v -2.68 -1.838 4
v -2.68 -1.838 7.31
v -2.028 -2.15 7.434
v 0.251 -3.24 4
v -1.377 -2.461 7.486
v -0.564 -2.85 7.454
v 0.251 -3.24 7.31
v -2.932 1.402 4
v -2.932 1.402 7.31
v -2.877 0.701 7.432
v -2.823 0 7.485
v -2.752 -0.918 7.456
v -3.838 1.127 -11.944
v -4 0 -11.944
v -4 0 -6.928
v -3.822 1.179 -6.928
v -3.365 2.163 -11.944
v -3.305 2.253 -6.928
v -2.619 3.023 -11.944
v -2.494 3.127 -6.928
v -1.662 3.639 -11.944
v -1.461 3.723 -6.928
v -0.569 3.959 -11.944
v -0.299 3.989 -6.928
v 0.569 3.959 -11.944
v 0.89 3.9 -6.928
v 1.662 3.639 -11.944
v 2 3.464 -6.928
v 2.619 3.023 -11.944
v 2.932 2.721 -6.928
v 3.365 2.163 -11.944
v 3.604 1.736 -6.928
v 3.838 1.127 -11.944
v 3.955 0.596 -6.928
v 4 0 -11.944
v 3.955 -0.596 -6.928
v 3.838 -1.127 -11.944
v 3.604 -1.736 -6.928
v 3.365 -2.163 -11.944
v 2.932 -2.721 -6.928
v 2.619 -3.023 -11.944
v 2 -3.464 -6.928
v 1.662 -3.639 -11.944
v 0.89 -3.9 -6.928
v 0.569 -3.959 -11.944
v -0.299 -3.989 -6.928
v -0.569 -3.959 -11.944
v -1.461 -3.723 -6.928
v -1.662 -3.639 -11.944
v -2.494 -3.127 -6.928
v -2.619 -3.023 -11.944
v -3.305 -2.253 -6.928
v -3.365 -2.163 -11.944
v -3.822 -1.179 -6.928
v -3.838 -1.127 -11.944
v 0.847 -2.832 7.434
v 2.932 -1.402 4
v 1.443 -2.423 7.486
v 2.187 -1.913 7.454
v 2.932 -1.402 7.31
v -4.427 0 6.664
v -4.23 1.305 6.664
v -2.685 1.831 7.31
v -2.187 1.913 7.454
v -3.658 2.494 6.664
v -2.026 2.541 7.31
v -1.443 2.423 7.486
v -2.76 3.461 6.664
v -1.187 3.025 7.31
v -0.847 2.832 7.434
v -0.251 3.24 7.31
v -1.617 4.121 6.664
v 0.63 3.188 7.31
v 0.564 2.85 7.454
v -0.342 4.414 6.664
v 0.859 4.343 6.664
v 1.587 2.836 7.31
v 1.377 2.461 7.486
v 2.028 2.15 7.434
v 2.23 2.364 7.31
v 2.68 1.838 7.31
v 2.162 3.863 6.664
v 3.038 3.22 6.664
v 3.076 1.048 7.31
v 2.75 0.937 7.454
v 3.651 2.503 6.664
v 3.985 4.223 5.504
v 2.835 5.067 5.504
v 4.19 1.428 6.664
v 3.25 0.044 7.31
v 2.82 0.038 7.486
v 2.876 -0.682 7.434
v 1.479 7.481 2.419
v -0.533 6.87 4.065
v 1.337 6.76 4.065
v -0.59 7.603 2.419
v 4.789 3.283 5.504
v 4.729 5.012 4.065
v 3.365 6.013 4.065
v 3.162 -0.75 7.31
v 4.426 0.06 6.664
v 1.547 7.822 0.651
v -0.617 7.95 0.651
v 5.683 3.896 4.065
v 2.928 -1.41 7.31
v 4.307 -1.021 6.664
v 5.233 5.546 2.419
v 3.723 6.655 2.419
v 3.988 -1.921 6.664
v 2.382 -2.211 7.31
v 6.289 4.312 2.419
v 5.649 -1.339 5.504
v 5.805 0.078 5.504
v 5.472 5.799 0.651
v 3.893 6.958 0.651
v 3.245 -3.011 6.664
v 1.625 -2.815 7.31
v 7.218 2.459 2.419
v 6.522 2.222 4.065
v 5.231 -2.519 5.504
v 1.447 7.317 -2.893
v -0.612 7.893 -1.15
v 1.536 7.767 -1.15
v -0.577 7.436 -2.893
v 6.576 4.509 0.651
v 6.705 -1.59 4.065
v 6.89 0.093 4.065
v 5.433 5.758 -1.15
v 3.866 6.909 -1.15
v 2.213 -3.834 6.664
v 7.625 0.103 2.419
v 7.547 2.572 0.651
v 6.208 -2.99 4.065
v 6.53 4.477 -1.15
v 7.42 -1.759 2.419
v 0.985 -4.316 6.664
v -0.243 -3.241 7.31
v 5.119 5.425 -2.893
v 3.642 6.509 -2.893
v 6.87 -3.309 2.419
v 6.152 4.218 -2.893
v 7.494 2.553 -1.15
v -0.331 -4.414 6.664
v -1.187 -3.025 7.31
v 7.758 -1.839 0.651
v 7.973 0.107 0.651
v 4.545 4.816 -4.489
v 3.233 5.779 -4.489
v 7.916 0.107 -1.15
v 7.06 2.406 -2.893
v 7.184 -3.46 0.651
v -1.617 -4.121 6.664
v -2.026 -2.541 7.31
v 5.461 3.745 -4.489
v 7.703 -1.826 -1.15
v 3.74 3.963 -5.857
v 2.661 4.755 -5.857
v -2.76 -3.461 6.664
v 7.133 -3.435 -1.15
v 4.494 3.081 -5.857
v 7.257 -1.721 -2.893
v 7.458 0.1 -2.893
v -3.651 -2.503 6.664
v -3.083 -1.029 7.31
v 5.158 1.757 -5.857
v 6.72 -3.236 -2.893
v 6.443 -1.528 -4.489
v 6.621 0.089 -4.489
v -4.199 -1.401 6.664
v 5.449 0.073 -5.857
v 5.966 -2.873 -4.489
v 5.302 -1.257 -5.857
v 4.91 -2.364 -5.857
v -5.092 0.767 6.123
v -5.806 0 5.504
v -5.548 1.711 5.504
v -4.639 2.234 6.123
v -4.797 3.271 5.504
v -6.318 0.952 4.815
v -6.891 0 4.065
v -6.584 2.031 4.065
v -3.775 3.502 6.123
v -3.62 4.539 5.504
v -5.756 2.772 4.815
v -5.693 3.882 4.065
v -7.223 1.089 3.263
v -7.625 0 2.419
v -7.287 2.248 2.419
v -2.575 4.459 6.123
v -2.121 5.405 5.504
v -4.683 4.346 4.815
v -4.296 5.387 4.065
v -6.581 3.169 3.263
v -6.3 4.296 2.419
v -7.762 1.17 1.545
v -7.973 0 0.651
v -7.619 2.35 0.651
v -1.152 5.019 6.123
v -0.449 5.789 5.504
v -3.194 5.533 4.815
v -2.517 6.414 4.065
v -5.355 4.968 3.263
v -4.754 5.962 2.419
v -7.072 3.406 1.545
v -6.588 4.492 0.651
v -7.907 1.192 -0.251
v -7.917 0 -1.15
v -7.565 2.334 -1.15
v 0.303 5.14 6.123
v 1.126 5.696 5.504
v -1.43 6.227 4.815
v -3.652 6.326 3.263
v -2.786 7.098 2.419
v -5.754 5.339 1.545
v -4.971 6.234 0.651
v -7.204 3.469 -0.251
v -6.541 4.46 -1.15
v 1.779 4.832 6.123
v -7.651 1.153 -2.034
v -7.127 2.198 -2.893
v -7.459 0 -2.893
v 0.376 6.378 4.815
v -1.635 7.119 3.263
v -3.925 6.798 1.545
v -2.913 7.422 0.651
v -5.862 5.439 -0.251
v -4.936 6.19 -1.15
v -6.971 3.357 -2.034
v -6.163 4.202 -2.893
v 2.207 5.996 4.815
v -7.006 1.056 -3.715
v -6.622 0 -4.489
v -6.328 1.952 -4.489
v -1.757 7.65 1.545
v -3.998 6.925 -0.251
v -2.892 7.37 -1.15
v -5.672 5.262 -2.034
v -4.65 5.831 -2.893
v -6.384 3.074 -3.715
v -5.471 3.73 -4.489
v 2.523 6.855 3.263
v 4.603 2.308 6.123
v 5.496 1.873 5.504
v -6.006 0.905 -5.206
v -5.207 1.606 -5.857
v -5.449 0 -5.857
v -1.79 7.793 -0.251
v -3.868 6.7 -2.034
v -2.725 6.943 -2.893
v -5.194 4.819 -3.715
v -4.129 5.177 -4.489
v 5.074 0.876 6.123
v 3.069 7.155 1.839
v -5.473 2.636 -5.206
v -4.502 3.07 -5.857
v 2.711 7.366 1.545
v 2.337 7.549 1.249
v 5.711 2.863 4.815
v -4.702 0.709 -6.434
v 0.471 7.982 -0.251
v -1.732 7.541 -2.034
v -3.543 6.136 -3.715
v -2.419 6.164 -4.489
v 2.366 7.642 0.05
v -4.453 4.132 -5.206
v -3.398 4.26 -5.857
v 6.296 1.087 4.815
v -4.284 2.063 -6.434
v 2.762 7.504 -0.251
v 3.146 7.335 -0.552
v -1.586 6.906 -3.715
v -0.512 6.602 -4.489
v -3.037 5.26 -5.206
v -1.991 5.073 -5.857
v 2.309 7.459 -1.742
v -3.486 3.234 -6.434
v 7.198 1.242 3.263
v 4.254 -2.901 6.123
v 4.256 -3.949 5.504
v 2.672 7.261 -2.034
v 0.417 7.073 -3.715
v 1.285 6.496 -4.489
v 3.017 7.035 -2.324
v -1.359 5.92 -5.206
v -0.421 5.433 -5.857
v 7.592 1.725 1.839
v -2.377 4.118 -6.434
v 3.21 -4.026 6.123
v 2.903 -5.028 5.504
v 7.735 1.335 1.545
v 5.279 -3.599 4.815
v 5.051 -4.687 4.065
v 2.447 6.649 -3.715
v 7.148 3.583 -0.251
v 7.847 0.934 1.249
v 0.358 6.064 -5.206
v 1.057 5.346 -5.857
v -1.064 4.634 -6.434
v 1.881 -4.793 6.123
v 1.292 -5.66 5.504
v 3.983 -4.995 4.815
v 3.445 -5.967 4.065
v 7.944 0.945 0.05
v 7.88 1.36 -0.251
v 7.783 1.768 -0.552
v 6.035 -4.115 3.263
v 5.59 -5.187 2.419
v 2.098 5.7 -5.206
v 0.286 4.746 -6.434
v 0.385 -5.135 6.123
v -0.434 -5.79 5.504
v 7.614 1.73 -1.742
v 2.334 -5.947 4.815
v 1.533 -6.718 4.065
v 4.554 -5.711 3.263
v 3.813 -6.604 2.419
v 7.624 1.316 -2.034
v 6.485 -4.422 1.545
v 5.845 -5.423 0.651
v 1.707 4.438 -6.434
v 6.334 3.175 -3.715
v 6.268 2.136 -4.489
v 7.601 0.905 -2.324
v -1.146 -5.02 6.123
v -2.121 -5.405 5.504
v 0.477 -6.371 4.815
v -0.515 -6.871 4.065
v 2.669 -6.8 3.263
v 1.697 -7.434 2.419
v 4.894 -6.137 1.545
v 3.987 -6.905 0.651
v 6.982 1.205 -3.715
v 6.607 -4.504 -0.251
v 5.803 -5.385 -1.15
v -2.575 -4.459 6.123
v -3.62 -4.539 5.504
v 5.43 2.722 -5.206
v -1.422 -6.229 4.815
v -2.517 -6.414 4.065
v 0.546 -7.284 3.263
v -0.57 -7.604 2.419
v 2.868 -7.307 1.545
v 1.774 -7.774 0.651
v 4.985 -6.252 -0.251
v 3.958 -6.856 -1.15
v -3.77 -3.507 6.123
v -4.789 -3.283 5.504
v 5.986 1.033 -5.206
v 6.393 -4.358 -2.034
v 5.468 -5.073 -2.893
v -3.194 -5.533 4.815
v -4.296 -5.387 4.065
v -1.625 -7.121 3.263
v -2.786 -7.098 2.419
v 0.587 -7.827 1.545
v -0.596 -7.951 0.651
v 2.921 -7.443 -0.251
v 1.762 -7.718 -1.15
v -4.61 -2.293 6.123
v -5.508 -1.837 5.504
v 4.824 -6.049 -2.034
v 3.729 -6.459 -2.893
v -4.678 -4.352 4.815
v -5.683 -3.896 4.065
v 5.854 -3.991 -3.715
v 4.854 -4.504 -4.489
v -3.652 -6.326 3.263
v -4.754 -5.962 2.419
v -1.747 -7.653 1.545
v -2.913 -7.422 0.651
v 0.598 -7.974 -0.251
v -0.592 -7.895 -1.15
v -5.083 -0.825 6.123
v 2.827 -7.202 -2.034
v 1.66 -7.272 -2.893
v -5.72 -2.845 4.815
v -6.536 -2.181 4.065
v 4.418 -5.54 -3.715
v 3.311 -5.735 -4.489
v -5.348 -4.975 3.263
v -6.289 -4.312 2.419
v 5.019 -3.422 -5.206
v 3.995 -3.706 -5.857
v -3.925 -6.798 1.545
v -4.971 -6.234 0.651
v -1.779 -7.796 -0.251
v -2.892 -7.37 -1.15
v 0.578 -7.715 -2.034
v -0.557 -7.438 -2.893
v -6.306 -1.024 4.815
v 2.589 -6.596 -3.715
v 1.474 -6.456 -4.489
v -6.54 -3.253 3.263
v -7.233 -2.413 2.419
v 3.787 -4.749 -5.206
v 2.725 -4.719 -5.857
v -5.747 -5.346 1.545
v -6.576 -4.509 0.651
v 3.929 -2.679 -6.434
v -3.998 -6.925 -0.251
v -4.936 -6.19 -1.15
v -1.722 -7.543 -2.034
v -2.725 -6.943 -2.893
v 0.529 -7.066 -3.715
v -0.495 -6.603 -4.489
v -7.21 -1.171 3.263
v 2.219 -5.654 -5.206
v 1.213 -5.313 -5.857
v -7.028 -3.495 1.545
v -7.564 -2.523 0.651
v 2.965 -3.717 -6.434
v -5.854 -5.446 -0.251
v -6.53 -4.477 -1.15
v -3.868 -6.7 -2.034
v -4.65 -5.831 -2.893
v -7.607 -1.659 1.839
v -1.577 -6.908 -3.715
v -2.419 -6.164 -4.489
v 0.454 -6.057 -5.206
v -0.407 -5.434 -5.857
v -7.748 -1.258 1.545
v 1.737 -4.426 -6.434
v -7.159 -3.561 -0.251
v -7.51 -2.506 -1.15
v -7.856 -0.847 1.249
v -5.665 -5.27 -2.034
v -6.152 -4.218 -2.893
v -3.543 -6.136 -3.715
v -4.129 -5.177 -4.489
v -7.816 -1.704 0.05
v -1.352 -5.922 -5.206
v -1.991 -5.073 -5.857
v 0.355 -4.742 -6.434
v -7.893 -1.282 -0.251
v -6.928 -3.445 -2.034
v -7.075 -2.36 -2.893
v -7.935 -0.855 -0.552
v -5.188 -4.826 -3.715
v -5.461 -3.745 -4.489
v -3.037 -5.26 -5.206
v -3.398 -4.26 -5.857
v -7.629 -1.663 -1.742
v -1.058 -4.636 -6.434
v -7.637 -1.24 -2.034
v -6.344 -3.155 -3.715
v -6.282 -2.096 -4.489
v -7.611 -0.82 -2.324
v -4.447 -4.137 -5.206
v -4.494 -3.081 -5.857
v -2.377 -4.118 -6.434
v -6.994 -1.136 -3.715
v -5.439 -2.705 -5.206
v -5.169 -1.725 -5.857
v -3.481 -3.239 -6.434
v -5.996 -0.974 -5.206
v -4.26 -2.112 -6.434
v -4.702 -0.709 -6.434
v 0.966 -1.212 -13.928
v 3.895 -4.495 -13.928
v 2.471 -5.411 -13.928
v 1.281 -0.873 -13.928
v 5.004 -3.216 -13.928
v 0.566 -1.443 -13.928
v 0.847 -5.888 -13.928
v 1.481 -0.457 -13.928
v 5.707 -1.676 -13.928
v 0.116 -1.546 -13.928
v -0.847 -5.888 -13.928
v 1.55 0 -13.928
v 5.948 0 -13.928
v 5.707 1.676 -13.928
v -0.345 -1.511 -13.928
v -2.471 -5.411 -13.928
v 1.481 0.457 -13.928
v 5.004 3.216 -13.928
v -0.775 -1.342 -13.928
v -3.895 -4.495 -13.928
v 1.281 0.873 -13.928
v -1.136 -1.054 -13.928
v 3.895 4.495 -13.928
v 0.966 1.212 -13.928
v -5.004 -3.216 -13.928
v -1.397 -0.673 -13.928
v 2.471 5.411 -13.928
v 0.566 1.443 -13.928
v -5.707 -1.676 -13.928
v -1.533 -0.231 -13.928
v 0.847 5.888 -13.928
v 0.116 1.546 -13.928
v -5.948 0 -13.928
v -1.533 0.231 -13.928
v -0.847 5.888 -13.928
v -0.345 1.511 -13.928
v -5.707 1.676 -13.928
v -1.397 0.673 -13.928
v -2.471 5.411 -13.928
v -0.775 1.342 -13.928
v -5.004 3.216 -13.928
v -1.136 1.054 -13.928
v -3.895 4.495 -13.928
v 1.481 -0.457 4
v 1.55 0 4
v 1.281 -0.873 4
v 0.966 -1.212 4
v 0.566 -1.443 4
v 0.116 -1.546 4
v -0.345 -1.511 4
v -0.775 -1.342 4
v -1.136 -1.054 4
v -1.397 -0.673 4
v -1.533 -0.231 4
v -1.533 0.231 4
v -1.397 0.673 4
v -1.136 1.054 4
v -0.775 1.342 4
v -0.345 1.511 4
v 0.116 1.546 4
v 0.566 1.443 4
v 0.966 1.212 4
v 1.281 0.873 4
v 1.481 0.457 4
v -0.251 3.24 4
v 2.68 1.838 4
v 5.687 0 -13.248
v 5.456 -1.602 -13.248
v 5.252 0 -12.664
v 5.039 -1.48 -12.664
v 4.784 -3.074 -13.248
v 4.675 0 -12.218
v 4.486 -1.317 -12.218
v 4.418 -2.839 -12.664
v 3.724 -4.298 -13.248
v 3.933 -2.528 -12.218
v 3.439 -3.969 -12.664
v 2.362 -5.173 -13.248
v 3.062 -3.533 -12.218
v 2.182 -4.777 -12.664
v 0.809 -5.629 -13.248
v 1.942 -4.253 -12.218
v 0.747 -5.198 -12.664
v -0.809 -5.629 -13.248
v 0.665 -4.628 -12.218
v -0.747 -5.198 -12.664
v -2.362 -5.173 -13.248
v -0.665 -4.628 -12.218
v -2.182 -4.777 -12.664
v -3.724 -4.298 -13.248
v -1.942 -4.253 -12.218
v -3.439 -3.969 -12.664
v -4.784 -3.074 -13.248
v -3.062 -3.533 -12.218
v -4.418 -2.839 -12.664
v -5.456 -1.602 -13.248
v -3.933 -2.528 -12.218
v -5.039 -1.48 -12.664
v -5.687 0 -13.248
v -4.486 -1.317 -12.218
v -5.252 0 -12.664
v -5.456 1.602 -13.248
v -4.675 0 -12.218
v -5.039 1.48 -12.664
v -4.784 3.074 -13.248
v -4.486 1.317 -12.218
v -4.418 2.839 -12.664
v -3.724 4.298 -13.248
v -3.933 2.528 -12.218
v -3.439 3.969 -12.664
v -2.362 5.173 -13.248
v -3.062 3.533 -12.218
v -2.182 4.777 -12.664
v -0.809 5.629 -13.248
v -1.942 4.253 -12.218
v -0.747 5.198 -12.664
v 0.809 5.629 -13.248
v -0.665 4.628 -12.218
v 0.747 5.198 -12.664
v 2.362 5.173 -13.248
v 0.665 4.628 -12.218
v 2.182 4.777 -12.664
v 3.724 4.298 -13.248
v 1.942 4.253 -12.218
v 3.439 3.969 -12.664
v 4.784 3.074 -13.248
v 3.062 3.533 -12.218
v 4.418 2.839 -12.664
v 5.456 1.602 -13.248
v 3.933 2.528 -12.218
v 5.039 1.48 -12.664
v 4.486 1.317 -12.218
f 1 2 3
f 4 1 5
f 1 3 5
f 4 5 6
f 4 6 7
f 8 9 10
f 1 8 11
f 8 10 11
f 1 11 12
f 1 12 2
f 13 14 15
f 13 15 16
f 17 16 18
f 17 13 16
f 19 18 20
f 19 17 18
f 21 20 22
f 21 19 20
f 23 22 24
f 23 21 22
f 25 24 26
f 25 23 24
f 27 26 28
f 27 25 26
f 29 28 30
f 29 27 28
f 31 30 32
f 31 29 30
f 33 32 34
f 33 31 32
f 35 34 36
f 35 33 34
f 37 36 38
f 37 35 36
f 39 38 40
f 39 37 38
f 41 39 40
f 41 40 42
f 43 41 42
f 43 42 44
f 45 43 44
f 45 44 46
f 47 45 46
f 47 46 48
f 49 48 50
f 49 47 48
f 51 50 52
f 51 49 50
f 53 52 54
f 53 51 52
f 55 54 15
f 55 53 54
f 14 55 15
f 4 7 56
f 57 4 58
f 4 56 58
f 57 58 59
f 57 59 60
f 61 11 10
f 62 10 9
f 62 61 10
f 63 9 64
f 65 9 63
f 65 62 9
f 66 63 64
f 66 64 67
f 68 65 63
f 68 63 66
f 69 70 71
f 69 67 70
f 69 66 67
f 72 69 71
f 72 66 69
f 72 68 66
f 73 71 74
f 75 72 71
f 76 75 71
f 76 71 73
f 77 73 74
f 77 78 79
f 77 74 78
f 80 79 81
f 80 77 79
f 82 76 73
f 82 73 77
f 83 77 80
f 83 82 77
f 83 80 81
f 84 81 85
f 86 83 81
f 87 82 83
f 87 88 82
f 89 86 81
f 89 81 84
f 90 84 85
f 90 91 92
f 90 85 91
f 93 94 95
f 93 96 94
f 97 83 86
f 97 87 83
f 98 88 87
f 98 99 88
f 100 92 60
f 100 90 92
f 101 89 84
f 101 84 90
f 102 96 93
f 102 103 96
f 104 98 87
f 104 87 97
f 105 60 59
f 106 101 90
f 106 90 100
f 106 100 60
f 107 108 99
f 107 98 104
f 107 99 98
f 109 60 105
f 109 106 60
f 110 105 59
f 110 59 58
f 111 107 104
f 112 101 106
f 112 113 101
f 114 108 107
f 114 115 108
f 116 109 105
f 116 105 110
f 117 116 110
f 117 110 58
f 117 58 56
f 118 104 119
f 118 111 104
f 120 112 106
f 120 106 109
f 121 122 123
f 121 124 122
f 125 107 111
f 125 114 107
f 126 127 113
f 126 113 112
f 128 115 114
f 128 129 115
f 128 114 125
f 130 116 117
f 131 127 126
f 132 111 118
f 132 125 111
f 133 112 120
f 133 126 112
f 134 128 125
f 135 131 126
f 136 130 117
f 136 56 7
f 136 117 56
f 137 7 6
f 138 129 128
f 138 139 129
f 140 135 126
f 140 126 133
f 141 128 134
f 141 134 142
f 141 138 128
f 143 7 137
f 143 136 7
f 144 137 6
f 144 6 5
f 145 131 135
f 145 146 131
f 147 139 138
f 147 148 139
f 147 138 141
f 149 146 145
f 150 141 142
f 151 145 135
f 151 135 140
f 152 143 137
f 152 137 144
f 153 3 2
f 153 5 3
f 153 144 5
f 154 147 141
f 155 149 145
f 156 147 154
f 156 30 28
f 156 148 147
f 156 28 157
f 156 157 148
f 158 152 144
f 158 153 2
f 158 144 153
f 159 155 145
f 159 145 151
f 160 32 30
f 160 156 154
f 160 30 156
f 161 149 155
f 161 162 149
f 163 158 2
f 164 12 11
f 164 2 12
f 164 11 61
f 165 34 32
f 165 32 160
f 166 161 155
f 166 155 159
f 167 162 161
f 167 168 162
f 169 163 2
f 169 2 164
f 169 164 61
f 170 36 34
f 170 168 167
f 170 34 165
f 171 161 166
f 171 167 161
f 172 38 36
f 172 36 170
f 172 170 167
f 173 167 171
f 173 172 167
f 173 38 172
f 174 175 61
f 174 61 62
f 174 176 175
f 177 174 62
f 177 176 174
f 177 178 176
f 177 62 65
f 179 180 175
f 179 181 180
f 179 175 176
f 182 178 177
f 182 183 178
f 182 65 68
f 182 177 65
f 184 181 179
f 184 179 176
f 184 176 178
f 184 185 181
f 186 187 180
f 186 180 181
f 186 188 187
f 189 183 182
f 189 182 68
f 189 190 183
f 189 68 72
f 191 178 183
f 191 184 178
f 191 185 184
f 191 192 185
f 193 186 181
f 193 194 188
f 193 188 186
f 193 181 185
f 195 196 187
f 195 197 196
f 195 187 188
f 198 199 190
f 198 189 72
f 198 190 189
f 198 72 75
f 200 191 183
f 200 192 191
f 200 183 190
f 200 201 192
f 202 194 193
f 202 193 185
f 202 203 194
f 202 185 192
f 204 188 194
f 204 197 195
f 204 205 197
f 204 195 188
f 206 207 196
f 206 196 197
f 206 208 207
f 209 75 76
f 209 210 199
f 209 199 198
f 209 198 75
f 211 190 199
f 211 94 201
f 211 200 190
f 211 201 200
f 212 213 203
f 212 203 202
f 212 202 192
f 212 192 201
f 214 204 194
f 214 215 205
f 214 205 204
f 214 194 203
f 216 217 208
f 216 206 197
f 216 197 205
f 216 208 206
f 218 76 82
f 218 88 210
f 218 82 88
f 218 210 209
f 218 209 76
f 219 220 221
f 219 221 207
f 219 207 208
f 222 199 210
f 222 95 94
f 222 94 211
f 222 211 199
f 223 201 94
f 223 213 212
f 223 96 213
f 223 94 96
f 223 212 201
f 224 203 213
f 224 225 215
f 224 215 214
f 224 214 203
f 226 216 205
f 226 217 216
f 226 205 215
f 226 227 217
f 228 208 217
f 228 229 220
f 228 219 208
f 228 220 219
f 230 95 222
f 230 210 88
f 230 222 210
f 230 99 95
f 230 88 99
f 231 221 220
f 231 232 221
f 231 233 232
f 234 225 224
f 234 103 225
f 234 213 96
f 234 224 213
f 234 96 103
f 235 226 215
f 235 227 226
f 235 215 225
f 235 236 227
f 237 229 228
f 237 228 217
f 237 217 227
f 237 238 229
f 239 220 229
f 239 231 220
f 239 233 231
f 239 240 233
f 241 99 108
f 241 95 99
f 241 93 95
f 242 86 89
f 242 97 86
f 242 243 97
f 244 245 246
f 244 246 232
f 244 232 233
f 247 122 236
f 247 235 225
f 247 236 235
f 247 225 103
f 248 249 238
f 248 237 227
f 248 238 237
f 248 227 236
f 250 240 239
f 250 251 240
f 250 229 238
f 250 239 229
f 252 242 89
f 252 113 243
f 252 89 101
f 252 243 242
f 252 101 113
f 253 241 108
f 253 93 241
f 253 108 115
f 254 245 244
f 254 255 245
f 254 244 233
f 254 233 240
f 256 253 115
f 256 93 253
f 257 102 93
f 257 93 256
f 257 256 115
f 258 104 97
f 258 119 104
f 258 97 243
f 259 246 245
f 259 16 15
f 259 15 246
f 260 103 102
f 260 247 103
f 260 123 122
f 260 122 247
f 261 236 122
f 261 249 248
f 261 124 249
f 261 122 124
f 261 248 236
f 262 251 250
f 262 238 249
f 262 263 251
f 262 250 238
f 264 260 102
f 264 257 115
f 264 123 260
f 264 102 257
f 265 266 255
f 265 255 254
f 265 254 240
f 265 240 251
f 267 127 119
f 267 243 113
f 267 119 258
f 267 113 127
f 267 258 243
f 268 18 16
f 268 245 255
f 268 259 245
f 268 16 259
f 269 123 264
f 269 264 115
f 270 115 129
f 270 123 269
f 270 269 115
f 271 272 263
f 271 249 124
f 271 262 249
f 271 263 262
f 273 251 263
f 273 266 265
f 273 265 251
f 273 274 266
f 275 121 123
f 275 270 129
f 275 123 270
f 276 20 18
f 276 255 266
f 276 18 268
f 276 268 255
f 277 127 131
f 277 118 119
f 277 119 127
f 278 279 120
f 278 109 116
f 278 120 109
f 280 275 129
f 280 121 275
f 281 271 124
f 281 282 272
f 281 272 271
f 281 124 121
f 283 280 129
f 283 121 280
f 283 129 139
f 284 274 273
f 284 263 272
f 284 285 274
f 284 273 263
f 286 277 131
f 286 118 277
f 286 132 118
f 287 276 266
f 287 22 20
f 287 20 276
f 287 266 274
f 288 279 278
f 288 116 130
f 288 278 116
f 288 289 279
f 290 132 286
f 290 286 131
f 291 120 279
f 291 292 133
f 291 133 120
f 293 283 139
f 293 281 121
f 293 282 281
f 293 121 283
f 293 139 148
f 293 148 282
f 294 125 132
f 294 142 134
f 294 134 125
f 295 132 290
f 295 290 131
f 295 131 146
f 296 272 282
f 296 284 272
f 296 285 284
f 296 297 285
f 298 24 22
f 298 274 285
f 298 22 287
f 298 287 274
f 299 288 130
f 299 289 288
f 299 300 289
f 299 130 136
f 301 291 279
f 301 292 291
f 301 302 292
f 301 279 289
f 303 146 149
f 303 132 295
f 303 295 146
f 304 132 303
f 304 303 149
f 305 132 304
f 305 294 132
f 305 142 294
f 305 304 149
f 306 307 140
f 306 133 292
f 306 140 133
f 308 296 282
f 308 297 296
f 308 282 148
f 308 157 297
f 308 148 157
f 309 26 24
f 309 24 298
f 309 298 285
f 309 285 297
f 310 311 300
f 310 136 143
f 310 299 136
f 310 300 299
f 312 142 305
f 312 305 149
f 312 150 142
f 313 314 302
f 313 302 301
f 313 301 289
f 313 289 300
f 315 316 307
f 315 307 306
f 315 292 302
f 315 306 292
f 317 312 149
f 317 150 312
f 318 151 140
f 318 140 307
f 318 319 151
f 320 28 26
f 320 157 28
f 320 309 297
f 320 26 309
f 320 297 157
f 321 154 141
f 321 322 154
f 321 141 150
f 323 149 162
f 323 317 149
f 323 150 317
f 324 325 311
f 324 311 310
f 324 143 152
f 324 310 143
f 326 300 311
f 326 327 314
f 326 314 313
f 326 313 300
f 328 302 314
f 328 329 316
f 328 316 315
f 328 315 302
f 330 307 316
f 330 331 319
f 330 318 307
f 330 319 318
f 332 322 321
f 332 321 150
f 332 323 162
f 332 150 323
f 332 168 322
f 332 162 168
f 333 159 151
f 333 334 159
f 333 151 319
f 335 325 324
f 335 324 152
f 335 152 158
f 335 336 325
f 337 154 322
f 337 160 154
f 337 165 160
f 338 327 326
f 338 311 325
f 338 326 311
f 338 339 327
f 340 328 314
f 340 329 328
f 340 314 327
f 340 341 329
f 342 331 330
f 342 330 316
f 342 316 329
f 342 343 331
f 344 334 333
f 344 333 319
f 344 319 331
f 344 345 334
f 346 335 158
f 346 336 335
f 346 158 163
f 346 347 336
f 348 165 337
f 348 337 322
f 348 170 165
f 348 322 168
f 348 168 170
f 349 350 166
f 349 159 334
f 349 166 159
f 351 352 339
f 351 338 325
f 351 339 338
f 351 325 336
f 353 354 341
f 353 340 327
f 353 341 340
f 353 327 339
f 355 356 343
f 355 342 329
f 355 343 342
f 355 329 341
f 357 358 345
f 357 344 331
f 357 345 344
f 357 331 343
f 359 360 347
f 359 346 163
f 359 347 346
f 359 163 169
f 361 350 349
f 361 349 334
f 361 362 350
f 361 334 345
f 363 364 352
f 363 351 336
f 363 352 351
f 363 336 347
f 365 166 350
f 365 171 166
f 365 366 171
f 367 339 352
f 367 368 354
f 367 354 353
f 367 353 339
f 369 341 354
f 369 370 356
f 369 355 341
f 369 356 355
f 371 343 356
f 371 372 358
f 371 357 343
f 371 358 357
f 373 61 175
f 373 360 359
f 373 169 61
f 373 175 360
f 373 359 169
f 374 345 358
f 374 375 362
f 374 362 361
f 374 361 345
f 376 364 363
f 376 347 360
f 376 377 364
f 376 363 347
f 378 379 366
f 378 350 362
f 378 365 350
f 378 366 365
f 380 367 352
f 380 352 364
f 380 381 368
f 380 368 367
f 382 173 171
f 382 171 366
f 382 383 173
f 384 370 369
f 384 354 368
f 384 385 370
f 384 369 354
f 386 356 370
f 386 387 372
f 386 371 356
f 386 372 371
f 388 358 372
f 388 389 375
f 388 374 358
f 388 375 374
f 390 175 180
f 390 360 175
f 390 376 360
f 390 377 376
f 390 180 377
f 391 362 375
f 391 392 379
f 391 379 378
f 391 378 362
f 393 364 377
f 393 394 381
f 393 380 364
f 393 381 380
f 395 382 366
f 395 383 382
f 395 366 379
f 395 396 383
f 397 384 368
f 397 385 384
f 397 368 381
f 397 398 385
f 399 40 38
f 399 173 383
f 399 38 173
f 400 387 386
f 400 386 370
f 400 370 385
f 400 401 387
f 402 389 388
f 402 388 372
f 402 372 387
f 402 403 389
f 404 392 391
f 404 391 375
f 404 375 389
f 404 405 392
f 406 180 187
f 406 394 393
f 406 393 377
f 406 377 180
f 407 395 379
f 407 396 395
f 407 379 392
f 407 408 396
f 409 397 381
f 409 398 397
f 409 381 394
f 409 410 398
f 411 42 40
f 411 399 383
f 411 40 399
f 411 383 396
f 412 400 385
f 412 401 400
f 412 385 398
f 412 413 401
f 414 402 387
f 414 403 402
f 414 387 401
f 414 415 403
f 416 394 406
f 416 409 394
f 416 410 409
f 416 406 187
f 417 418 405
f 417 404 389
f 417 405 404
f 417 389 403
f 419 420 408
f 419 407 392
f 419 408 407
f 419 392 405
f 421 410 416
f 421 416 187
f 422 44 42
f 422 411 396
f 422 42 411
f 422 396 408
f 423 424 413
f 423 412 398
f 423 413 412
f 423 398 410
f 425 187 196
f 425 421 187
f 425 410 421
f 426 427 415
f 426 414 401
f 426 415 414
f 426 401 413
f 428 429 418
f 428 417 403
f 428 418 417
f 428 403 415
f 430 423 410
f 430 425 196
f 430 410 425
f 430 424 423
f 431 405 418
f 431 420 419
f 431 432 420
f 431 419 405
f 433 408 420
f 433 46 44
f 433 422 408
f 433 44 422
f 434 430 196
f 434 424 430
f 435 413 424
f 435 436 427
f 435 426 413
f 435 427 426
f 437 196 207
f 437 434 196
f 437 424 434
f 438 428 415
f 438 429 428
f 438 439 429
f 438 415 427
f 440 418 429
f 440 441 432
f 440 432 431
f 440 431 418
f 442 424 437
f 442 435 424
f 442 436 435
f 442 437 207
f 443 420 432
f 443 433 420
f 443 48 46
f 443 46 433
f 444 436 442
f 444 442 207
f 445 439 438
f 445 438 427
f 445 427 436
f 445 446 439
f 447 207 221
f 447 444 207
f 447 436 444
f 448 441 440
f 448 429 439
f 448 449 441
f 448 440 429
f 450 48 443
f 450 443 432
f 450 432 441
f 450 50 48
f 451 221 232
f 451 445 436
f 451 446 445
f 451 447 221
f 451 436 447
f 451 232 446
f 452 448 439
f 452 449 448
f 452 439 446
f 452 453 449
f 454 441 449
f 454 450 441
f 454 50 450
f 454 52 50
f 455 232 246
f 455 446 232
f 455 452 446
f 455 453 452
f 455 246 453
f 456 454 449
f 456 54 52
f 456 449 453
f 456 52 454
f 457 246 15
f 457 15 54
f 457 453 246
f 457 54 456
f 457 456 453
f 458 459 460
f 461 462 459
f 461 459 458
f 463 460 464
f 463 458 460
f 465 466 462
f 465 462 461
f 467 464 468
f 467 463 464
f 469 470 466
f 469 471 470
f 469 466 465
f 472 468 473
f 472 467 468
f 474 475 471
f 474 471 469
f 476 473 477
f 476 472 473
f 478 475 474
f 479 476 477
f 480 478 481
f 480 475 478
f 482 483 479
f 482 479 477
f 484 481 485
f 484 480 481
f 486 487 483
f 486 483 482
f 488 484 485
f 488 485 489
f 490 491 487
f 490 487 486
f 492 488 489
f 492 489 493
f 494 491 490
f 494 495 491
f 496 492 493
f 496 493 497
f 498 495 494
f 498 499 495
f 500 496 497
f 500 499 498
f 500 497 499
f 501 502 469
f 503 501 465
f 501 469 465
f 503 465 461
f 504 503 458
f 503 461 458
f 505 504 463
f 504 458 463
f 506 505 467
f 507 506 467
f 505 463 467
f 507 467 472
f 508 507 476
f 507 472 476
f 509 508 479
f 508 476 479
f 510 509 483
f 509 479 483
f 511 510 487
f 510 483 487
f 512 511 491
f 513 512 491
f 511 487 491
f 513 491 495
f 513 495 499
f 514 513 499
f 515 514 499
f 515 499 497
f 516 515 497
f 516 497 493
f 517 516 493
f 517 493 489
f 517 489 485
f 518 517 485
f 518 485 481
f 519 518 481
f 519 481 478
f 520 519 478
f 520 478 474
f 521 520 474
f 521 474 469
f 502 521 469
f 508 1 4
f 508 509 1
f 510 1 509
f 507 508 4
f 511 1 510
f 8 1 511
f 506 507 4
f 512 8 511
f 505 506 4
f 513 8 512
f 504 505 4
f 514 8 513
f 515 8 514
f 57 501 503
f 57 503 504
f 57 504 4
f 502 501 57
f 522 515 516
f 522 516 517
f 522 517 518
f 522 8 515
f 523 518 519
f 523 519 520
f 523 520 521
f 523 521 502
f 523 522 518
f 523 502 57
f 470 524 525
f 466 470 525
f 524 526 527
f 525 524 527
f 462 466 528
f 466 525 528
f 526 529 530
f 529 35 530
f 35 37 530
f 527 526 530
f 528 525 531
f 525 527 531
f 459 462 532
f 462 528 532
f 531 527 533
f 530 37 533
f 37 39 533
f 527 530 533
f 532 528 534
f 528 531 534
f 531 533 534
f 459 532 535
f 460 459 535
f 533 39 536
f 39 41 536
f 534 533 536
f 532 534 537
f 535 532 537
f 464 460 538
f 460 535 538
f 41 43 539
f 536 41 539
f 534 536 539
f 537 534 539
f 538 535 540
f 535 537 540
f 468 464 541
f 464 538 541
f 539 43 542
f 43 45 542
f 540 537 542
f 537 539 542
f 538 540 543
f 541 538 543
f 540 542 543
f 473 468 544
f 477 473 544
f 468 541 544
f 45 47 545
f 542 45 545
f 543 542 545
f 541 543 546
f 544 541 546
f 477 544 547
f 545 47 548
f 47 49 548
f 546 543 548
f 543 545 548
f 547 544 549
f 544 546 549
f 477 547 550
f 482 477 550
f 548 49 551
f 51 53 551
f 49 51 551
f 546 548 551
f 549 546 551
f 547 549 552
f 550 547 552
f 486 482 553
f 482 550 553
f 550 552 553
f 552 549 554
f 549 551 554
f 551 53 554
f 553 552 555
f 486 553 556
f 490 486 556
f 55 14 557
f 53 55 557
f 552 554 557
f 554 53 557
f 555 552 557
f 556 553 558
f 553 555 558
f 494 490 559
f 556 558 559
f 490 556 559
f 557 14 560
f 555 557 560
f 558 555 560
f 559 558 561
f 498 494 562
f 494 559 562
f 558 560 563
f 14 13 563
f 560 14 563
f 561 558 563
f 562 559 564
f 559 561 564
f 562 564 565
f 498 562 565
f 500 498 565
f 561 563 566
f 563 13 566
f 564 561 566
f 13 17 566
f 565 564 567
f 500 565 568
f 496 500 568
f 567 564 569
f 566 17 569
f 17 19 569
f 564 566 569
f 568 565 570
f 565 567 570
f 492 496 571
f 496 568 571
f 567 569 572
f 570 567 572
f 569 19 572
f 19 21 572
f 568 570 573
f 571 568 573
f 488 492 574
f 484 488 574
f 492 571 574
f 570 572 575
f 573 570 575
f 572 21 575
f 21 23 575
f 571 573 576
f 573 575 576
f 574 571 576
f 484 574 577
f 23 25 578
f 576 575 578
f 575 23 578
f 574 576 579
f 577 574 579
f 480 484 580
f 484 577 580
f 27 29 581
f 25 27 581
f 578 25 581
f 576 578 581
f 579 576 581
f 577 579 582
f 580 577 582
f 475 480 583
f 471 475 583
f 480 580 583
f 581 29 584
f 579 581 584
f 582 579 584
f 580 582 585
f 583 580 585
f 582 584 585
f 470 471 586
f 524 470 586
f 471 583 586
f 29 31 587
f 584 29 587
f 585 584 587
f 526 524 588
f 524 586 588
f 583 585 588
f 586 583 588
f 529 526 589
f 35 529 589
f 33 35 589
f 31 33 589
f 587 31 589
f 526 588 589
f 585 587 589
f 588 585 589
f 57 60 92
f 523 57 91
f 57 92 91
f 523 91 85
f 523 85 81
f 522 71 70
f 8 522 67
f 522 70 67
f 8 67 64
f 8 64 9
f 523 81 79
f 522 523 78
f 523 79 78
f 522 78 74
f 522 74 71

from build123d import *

# Parameters (mm, degrees)
F3_R     = 1.55
F4_DEPTH = 21.928203
F7_DEPTH = 4


with BuildPart() as f2:
    # F1 (on Front) → F2 (revolve)
    with BuildSketch(Plane.XZ):
        with BuildLine():
            Line((-4, -6.928203), (-4, -13.928203))
            Line((-4, -13.928203), (0, -13.928203))
            Line((0, -13.928203), (0, 8))
            ThreePointArc((0, 8), (-7.727407, 2.070552), (-4, -6.928203))
        make_face()
    revolve(axis=Axis((0, 0, -6.658787), (0, 0, -1)))

    # F3 (on face) → F4 (cut, through all)
    with BuildSketch(Plane(origin=(0, 0, -13.928203), x_dir=(1, 0, 0), z_dir=(0, 0, -1))):
        Circle(F3_R)
    extrude(amount=-F4_DEPTH, mode=Mode.SUBTRACT)

    # F6 (on offset) → F7 (cut)
    with BuildSketch(Plane.XY.offset(8)):
        Polygon((0.251373, -3.240264), (2.931837, -1.402437), (2.680465, 1.837827), (-0.251373, 3.240264), (-2.931837, 1.402437), (-2.680465, -1.837827), align=None)
    extrude(amount=-F7_DEPTH, mode=Mode.SUBTRACT)

    # F8 (on Front) → F9 (revolve)
    with BuildSketch(Plane.XZ):
        with BuildLine():
            Line((3.934291, -11.928251), (3.948121, -13.928203))
            Line((3.948121, -13.928203), (5.948121, -13.928203))
            ThreePointArc((5.948121, -13.928203), (5.227793, -12.639651), (3.934291, -11.928251))
        make_face()
    revolve(axis=Axis((0, 0, -6.658787), (0, 0, -1)))


solid = f2.part
